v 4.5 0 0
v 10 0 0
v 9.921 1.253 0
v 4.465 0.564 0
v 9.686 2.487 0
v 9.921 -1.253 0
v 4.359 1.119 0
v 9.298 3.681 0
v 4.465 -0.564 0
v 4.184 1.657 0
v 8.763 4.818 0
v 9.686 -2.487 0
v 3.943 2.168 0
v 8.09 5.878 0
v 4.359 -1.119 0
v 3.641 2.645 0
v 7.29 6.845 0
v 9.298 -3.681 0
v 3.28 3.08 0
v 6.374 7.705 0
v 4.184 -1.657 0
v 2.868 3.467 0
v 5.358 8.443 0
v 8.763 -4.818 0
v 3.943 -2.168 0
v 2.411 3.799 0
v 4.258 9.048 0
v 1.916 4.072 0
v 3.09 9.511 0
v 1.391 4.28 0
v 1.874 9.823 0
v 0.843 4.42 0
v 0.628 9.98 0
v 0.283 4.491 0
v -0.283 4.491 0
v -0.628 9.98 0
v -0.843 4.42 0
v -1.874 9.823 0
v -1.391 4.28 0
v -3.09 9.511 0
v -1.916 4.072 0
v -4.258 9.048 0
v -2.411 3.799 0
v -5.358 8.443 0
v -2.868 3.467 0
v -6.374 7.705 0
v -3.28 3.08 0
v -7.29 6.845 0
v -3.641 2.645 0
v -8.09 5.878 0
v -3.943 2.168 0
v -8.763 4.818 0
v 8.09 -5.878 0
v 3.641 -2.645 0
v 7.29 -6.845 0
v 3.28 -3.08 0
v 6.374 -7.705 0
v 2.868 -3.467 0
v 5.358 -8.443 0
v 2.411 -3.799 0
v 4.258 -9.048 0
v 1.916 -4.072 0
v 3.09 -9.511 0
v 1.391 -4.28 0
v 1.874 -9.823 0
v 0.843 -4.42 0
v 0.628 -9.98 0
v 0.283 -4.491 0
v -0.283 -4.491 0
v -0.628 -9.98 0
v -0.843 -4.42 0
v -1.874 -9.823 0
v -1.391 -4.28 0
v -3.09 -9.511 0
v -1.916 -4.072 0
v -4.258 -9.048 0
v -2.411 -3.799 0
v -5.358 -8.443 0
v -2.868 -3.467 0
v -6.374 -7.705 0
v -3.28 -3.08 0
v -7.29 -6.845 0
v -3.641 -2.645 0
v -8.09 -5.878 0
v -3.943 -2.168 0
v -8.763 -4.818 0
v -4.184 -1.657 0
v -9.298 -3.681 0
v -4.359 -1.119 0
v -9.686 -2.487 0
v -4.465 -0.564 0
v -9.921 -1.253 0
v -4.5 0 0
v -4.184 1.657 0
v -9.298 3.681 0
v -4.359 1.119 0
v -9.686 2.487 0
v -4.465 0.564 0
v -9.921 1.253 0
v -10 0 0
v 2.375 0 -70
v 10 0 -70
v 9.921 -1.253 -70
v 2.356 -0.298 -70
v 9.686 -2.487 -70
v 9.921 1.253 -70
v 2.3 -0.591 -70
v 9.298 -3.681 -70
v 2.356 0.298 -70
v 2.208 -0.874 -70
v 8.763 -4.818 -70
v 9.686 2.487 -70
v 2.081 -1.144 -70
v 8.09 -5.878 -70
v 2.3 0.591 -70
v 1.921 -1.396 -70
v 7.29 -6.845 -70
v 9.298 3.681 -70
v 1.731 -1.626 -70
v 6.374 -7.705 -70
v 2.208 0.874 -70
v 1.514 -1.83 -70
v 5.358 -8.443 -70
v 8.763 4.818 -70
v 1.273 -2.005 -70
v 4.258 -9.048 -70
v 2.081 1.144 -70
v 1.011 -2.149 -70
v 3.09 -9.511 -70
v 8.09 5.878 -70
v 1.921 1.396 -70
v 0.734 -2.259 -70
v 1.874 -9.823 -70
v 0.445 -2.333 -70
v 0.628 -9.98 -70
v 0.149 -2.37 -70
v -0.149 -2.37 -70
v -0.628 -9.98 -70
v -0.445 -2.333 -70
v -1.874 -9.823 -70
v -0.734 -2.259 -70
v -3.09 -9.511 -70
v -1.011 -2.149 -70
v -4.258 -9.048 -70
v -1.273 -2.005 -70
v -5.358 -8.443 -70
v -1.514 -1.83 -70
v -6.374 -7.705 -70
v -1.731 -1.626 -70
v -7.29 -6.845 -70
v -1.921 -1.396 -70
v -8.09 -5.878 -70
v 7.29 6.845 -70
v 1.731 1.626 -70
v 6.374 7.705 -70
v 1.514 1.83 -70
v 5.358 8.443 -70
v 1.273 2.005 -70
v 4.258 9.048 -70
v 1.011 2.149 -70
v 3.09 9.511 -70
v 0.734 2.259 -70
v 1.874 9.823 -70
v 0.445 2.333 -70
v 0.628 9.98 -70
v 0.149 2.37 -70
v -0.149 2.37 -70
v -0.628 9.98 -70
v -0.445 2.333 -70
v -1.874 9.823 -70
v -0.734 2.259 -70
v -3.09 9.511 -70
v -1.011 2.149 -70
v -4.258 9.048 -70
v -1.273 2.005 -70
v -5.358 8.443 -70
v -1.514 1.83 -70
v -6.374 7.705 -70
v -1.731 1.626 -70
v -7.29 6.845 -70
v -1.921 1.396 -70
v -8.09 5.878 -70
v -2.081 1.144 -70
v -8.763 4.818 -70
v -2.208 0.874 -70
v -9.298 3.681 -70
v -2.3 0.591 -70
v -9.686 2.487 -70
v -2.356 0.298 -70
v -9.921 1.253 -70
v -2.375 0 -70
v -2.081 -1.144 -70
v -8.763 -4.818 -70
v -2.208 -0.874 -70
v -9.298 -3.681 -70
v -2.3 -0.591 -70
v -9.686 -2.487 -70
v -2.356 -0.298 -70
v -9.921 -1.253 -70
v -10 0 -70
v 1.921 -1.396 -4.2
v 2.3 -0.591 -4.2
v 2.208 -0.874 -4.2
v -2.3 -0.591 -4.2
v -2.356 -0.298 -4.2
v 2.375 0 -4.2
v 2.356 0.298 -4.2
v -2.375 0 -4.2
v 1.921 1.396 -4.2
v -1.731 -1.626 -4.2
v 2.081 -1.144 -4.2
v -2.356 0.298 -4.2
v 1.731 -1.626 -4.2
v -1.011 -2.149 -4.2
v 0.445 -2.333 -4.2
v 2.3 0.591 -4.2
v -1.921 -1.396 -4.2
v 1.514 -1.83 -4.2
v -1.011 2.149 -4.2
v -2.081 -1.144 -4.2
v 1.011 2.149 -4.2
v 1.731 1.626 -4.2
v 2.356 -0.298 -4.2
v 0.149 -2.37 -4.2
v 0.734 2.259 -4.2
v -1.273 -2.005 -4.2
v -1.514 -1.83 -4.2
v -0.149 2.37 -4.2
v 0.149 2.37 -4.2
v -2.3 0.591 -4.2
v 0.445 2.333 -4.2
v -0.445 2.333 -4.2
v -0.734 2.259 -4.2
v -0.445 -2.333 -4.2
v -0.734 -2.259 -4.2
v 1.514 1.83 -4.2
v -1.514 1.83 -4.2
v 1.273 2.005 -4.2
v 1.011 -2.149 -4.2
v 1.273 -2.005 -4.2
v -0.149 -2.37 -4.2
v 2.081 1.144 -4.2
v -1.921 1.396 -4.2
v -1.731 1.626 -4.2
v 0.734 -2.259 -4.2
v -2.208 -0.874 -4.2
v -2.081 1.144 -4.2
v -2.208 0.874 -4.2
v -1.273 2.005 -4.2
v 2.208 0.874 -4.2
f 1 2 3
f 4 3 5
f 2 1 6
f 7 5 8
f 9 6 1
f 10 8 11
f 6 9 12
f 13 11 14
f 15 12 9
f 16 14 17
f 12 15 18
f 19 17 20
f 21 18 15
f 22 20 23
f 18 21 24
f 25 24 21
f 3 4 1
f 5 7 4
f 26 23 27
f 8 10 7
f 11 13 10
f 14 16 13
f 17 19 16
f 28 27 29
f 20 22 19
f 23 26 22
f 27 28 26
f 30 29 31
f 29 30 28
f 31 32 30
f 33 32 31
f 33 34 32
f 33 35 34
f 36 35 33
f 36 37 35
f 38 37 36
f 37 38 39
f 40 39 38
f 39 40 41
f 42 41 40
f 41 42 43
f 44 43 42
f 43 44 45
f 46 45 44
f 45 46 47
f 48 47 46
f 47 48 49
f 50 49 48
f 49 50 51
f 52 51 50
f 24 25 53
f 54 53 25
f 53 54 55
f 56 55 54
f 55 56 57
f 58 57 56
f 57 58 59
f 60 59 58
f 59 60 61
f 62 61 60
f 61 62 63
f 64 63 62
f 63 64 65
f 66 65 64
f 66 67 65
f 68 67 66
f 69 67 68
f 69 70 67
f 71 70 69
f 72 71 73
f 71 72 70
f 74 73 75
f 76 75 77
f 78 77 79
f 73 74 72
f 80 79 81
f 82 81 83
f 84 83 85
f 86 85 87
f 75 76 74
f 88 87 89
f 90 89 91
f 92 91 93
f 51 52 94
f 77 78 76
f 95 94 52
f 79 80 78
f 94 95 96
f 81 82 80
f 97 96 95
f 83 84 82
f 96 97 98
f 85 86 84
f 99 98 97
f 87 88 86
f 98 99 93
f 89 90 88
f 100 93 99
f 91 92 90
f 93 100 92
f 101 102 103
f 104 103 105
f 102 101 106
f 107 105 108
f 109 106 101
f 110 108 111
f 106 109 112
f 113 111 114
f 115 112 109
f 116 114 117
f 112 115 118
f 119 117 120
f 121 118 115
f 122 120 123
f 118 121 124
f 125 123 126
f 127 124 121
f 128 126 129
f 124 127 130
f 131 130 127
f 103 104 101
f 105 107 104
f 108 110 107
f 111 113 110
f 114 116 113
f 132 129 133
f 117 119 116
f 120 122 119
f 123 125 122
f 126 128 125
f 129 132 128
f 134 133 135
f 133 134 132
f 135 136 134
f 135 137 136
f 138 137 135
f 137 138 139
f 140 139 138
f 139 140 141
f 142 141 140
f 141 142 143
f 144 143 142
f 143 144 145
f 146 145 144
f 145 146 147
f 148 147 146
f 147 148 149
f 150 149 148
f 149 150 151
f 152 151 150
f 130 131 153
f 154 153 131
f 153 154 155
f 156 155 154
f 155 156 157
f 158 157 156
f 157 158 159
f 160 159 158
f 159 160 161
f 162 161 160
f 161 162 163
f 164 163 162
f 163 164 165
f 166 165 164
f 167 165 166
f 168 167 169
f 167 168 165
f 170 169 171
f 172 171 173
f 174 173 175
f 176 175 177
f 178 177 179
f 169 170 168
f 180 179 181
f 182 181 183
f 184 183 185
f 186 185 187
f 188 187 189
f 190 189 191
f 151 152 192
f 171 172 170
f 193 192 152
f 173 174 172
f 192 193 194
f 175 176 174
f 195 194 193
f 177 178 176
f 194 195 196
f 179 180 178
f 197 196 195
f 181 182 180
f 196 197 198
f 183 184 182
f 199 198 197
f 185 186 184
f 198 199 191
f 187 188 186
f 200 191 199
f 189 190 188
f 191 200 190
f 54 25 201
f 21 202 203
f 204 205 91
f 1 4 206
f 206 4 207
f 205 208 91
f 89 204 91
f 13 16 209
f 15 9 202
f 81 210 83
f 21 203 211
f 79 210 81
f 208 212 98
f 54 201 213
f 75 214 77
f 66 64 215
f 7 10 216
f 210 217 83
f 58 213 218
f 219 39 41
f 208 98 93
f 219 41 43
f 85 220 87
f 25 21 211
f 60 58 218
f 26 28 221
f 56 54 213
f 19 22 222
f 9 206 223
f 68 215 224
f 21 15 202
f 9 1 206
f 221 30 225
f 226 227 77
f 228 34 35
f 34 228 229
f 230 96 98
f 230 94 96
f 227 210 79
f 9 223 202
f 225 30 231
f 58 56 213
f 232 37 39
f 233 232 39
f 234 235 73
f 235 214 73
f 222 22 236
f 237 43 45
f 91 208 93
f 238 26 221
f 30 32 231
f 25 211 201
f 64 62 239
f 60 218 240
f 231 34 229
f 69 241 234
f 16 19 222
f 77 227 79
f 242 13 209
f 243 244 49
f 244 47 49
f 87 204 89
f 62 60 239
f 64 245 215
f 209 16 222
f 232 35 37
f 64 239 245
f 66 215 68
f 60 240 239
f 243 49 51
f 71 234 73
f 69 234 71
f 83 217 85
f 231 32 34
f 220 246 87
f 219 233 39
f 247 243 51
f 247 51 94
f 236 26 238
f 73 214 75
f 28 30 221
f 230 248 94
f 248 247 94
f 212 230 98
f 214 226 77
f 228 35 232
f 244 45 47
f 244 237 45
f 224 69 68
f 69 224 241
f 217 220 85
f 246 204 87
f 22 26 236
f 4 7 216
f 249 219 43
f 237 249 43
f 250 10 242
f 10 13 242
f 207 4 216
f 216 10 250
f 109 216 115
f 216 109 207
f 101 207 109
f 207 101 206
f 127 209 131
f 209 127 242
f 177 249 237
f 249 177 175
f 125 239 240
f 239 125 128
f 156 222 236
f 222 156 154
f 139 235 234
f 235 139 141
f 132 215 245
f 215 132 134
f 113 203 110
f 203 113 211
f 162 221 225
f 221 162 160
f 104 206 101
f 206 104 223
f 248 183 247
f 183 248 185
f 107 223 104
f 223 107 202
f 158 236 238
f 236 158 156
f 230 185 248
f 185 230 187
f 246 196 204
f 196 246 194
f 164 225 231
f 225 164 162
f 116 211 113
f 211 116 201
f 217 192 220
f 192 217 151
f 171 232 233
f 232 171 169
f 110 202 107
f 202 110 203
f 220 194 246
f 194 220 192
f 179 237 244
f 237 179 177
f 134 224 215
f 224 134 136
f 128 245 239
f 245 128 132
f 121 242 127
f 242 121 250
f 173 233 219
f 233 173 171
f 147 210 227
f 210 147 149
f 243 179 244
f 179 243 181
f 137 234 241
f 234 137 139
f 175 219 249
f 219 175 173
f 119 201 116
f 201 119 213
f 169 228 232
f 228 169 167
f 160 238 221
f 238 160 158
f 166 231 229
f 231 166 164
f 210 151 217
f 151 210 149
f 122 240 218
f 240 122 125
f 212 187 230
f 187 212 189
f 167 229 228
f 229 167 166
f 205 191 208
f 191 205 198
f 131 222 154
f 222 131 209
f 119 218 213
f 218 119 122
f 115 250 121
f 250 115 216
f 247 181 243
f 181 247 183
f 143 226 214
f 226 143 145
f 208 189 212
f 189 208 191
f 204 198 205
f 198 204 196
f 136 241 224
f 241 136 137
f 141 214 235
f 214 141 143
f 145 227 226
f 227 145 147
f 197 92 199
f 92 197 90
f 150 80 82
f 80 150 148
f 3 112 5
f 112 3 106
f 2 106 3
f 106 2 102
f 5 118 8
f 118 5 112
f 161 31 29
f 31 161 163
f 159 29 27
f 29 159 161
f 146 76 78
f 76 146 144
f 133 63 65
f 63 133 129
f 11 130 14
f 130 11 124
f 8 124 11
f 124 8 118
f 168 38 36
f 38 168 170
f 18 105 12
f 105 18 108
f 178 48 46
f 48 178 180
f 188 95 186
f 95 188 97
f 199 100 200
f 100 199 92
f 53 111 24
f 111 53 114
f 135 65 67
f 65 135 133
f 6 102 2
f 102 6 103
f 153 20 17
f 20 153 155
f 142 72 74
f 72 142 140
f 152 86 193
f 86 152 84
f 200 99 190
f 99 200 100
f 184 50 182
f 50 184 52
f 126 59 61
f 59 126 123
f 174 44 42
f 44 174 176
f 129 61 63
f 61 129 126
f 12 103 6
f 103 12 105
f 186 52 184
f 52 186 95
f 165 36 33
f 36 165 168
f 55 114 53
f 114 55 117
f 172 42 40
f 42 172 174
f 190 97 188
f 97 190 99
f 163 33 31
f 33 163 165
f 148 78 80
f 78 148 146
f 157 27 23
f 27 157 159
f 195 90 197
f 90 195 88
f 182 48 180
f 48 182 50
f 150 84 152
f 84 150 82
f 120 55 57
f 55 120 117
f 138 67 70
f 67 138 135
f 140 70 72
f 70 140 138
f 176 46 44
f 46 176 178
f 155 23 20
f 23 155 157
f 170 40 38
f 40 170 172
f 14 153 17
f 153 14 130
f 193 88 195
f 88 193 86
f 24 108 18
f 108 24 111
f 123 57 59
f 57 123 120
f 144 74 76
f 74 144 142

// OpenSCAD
$fn = 50;


difference() {
	union() {
		translate(v = [0, 0, -70.0000000000]) {
			cylinder(h = 70, r = 10.0000000000);
		}
		cylinder(h = 0, r = 13.0000000000);
	}
	union() {
		translate(v = [0, 0, 0]) {
			rotate(a = [0, 0, 0]) {
				difference() {
					union() {
						#translate(v = [0, 0, -70.0000000000]) {
							cylinder(h = 70, r = 2.2500000000);
						}
						#translate(v = [0, 0, -4.2000000000]) {
							cylinder(h = 4.2000000000, r = 10.0000000000, r1 = 2.3750000000, r2 = 4.5000000000);
						}
						#translate(v = [0, 0, -70.0000000000]) {
							cylinder(h = 70, r = 2.3750000000);
						}
						#translate(v = [0, 0, -70.0000000000]) {
							cylinder(h = 70, r = 2.2500000000);
						}
					}
					union();
				}
			}
		}
	}
}
